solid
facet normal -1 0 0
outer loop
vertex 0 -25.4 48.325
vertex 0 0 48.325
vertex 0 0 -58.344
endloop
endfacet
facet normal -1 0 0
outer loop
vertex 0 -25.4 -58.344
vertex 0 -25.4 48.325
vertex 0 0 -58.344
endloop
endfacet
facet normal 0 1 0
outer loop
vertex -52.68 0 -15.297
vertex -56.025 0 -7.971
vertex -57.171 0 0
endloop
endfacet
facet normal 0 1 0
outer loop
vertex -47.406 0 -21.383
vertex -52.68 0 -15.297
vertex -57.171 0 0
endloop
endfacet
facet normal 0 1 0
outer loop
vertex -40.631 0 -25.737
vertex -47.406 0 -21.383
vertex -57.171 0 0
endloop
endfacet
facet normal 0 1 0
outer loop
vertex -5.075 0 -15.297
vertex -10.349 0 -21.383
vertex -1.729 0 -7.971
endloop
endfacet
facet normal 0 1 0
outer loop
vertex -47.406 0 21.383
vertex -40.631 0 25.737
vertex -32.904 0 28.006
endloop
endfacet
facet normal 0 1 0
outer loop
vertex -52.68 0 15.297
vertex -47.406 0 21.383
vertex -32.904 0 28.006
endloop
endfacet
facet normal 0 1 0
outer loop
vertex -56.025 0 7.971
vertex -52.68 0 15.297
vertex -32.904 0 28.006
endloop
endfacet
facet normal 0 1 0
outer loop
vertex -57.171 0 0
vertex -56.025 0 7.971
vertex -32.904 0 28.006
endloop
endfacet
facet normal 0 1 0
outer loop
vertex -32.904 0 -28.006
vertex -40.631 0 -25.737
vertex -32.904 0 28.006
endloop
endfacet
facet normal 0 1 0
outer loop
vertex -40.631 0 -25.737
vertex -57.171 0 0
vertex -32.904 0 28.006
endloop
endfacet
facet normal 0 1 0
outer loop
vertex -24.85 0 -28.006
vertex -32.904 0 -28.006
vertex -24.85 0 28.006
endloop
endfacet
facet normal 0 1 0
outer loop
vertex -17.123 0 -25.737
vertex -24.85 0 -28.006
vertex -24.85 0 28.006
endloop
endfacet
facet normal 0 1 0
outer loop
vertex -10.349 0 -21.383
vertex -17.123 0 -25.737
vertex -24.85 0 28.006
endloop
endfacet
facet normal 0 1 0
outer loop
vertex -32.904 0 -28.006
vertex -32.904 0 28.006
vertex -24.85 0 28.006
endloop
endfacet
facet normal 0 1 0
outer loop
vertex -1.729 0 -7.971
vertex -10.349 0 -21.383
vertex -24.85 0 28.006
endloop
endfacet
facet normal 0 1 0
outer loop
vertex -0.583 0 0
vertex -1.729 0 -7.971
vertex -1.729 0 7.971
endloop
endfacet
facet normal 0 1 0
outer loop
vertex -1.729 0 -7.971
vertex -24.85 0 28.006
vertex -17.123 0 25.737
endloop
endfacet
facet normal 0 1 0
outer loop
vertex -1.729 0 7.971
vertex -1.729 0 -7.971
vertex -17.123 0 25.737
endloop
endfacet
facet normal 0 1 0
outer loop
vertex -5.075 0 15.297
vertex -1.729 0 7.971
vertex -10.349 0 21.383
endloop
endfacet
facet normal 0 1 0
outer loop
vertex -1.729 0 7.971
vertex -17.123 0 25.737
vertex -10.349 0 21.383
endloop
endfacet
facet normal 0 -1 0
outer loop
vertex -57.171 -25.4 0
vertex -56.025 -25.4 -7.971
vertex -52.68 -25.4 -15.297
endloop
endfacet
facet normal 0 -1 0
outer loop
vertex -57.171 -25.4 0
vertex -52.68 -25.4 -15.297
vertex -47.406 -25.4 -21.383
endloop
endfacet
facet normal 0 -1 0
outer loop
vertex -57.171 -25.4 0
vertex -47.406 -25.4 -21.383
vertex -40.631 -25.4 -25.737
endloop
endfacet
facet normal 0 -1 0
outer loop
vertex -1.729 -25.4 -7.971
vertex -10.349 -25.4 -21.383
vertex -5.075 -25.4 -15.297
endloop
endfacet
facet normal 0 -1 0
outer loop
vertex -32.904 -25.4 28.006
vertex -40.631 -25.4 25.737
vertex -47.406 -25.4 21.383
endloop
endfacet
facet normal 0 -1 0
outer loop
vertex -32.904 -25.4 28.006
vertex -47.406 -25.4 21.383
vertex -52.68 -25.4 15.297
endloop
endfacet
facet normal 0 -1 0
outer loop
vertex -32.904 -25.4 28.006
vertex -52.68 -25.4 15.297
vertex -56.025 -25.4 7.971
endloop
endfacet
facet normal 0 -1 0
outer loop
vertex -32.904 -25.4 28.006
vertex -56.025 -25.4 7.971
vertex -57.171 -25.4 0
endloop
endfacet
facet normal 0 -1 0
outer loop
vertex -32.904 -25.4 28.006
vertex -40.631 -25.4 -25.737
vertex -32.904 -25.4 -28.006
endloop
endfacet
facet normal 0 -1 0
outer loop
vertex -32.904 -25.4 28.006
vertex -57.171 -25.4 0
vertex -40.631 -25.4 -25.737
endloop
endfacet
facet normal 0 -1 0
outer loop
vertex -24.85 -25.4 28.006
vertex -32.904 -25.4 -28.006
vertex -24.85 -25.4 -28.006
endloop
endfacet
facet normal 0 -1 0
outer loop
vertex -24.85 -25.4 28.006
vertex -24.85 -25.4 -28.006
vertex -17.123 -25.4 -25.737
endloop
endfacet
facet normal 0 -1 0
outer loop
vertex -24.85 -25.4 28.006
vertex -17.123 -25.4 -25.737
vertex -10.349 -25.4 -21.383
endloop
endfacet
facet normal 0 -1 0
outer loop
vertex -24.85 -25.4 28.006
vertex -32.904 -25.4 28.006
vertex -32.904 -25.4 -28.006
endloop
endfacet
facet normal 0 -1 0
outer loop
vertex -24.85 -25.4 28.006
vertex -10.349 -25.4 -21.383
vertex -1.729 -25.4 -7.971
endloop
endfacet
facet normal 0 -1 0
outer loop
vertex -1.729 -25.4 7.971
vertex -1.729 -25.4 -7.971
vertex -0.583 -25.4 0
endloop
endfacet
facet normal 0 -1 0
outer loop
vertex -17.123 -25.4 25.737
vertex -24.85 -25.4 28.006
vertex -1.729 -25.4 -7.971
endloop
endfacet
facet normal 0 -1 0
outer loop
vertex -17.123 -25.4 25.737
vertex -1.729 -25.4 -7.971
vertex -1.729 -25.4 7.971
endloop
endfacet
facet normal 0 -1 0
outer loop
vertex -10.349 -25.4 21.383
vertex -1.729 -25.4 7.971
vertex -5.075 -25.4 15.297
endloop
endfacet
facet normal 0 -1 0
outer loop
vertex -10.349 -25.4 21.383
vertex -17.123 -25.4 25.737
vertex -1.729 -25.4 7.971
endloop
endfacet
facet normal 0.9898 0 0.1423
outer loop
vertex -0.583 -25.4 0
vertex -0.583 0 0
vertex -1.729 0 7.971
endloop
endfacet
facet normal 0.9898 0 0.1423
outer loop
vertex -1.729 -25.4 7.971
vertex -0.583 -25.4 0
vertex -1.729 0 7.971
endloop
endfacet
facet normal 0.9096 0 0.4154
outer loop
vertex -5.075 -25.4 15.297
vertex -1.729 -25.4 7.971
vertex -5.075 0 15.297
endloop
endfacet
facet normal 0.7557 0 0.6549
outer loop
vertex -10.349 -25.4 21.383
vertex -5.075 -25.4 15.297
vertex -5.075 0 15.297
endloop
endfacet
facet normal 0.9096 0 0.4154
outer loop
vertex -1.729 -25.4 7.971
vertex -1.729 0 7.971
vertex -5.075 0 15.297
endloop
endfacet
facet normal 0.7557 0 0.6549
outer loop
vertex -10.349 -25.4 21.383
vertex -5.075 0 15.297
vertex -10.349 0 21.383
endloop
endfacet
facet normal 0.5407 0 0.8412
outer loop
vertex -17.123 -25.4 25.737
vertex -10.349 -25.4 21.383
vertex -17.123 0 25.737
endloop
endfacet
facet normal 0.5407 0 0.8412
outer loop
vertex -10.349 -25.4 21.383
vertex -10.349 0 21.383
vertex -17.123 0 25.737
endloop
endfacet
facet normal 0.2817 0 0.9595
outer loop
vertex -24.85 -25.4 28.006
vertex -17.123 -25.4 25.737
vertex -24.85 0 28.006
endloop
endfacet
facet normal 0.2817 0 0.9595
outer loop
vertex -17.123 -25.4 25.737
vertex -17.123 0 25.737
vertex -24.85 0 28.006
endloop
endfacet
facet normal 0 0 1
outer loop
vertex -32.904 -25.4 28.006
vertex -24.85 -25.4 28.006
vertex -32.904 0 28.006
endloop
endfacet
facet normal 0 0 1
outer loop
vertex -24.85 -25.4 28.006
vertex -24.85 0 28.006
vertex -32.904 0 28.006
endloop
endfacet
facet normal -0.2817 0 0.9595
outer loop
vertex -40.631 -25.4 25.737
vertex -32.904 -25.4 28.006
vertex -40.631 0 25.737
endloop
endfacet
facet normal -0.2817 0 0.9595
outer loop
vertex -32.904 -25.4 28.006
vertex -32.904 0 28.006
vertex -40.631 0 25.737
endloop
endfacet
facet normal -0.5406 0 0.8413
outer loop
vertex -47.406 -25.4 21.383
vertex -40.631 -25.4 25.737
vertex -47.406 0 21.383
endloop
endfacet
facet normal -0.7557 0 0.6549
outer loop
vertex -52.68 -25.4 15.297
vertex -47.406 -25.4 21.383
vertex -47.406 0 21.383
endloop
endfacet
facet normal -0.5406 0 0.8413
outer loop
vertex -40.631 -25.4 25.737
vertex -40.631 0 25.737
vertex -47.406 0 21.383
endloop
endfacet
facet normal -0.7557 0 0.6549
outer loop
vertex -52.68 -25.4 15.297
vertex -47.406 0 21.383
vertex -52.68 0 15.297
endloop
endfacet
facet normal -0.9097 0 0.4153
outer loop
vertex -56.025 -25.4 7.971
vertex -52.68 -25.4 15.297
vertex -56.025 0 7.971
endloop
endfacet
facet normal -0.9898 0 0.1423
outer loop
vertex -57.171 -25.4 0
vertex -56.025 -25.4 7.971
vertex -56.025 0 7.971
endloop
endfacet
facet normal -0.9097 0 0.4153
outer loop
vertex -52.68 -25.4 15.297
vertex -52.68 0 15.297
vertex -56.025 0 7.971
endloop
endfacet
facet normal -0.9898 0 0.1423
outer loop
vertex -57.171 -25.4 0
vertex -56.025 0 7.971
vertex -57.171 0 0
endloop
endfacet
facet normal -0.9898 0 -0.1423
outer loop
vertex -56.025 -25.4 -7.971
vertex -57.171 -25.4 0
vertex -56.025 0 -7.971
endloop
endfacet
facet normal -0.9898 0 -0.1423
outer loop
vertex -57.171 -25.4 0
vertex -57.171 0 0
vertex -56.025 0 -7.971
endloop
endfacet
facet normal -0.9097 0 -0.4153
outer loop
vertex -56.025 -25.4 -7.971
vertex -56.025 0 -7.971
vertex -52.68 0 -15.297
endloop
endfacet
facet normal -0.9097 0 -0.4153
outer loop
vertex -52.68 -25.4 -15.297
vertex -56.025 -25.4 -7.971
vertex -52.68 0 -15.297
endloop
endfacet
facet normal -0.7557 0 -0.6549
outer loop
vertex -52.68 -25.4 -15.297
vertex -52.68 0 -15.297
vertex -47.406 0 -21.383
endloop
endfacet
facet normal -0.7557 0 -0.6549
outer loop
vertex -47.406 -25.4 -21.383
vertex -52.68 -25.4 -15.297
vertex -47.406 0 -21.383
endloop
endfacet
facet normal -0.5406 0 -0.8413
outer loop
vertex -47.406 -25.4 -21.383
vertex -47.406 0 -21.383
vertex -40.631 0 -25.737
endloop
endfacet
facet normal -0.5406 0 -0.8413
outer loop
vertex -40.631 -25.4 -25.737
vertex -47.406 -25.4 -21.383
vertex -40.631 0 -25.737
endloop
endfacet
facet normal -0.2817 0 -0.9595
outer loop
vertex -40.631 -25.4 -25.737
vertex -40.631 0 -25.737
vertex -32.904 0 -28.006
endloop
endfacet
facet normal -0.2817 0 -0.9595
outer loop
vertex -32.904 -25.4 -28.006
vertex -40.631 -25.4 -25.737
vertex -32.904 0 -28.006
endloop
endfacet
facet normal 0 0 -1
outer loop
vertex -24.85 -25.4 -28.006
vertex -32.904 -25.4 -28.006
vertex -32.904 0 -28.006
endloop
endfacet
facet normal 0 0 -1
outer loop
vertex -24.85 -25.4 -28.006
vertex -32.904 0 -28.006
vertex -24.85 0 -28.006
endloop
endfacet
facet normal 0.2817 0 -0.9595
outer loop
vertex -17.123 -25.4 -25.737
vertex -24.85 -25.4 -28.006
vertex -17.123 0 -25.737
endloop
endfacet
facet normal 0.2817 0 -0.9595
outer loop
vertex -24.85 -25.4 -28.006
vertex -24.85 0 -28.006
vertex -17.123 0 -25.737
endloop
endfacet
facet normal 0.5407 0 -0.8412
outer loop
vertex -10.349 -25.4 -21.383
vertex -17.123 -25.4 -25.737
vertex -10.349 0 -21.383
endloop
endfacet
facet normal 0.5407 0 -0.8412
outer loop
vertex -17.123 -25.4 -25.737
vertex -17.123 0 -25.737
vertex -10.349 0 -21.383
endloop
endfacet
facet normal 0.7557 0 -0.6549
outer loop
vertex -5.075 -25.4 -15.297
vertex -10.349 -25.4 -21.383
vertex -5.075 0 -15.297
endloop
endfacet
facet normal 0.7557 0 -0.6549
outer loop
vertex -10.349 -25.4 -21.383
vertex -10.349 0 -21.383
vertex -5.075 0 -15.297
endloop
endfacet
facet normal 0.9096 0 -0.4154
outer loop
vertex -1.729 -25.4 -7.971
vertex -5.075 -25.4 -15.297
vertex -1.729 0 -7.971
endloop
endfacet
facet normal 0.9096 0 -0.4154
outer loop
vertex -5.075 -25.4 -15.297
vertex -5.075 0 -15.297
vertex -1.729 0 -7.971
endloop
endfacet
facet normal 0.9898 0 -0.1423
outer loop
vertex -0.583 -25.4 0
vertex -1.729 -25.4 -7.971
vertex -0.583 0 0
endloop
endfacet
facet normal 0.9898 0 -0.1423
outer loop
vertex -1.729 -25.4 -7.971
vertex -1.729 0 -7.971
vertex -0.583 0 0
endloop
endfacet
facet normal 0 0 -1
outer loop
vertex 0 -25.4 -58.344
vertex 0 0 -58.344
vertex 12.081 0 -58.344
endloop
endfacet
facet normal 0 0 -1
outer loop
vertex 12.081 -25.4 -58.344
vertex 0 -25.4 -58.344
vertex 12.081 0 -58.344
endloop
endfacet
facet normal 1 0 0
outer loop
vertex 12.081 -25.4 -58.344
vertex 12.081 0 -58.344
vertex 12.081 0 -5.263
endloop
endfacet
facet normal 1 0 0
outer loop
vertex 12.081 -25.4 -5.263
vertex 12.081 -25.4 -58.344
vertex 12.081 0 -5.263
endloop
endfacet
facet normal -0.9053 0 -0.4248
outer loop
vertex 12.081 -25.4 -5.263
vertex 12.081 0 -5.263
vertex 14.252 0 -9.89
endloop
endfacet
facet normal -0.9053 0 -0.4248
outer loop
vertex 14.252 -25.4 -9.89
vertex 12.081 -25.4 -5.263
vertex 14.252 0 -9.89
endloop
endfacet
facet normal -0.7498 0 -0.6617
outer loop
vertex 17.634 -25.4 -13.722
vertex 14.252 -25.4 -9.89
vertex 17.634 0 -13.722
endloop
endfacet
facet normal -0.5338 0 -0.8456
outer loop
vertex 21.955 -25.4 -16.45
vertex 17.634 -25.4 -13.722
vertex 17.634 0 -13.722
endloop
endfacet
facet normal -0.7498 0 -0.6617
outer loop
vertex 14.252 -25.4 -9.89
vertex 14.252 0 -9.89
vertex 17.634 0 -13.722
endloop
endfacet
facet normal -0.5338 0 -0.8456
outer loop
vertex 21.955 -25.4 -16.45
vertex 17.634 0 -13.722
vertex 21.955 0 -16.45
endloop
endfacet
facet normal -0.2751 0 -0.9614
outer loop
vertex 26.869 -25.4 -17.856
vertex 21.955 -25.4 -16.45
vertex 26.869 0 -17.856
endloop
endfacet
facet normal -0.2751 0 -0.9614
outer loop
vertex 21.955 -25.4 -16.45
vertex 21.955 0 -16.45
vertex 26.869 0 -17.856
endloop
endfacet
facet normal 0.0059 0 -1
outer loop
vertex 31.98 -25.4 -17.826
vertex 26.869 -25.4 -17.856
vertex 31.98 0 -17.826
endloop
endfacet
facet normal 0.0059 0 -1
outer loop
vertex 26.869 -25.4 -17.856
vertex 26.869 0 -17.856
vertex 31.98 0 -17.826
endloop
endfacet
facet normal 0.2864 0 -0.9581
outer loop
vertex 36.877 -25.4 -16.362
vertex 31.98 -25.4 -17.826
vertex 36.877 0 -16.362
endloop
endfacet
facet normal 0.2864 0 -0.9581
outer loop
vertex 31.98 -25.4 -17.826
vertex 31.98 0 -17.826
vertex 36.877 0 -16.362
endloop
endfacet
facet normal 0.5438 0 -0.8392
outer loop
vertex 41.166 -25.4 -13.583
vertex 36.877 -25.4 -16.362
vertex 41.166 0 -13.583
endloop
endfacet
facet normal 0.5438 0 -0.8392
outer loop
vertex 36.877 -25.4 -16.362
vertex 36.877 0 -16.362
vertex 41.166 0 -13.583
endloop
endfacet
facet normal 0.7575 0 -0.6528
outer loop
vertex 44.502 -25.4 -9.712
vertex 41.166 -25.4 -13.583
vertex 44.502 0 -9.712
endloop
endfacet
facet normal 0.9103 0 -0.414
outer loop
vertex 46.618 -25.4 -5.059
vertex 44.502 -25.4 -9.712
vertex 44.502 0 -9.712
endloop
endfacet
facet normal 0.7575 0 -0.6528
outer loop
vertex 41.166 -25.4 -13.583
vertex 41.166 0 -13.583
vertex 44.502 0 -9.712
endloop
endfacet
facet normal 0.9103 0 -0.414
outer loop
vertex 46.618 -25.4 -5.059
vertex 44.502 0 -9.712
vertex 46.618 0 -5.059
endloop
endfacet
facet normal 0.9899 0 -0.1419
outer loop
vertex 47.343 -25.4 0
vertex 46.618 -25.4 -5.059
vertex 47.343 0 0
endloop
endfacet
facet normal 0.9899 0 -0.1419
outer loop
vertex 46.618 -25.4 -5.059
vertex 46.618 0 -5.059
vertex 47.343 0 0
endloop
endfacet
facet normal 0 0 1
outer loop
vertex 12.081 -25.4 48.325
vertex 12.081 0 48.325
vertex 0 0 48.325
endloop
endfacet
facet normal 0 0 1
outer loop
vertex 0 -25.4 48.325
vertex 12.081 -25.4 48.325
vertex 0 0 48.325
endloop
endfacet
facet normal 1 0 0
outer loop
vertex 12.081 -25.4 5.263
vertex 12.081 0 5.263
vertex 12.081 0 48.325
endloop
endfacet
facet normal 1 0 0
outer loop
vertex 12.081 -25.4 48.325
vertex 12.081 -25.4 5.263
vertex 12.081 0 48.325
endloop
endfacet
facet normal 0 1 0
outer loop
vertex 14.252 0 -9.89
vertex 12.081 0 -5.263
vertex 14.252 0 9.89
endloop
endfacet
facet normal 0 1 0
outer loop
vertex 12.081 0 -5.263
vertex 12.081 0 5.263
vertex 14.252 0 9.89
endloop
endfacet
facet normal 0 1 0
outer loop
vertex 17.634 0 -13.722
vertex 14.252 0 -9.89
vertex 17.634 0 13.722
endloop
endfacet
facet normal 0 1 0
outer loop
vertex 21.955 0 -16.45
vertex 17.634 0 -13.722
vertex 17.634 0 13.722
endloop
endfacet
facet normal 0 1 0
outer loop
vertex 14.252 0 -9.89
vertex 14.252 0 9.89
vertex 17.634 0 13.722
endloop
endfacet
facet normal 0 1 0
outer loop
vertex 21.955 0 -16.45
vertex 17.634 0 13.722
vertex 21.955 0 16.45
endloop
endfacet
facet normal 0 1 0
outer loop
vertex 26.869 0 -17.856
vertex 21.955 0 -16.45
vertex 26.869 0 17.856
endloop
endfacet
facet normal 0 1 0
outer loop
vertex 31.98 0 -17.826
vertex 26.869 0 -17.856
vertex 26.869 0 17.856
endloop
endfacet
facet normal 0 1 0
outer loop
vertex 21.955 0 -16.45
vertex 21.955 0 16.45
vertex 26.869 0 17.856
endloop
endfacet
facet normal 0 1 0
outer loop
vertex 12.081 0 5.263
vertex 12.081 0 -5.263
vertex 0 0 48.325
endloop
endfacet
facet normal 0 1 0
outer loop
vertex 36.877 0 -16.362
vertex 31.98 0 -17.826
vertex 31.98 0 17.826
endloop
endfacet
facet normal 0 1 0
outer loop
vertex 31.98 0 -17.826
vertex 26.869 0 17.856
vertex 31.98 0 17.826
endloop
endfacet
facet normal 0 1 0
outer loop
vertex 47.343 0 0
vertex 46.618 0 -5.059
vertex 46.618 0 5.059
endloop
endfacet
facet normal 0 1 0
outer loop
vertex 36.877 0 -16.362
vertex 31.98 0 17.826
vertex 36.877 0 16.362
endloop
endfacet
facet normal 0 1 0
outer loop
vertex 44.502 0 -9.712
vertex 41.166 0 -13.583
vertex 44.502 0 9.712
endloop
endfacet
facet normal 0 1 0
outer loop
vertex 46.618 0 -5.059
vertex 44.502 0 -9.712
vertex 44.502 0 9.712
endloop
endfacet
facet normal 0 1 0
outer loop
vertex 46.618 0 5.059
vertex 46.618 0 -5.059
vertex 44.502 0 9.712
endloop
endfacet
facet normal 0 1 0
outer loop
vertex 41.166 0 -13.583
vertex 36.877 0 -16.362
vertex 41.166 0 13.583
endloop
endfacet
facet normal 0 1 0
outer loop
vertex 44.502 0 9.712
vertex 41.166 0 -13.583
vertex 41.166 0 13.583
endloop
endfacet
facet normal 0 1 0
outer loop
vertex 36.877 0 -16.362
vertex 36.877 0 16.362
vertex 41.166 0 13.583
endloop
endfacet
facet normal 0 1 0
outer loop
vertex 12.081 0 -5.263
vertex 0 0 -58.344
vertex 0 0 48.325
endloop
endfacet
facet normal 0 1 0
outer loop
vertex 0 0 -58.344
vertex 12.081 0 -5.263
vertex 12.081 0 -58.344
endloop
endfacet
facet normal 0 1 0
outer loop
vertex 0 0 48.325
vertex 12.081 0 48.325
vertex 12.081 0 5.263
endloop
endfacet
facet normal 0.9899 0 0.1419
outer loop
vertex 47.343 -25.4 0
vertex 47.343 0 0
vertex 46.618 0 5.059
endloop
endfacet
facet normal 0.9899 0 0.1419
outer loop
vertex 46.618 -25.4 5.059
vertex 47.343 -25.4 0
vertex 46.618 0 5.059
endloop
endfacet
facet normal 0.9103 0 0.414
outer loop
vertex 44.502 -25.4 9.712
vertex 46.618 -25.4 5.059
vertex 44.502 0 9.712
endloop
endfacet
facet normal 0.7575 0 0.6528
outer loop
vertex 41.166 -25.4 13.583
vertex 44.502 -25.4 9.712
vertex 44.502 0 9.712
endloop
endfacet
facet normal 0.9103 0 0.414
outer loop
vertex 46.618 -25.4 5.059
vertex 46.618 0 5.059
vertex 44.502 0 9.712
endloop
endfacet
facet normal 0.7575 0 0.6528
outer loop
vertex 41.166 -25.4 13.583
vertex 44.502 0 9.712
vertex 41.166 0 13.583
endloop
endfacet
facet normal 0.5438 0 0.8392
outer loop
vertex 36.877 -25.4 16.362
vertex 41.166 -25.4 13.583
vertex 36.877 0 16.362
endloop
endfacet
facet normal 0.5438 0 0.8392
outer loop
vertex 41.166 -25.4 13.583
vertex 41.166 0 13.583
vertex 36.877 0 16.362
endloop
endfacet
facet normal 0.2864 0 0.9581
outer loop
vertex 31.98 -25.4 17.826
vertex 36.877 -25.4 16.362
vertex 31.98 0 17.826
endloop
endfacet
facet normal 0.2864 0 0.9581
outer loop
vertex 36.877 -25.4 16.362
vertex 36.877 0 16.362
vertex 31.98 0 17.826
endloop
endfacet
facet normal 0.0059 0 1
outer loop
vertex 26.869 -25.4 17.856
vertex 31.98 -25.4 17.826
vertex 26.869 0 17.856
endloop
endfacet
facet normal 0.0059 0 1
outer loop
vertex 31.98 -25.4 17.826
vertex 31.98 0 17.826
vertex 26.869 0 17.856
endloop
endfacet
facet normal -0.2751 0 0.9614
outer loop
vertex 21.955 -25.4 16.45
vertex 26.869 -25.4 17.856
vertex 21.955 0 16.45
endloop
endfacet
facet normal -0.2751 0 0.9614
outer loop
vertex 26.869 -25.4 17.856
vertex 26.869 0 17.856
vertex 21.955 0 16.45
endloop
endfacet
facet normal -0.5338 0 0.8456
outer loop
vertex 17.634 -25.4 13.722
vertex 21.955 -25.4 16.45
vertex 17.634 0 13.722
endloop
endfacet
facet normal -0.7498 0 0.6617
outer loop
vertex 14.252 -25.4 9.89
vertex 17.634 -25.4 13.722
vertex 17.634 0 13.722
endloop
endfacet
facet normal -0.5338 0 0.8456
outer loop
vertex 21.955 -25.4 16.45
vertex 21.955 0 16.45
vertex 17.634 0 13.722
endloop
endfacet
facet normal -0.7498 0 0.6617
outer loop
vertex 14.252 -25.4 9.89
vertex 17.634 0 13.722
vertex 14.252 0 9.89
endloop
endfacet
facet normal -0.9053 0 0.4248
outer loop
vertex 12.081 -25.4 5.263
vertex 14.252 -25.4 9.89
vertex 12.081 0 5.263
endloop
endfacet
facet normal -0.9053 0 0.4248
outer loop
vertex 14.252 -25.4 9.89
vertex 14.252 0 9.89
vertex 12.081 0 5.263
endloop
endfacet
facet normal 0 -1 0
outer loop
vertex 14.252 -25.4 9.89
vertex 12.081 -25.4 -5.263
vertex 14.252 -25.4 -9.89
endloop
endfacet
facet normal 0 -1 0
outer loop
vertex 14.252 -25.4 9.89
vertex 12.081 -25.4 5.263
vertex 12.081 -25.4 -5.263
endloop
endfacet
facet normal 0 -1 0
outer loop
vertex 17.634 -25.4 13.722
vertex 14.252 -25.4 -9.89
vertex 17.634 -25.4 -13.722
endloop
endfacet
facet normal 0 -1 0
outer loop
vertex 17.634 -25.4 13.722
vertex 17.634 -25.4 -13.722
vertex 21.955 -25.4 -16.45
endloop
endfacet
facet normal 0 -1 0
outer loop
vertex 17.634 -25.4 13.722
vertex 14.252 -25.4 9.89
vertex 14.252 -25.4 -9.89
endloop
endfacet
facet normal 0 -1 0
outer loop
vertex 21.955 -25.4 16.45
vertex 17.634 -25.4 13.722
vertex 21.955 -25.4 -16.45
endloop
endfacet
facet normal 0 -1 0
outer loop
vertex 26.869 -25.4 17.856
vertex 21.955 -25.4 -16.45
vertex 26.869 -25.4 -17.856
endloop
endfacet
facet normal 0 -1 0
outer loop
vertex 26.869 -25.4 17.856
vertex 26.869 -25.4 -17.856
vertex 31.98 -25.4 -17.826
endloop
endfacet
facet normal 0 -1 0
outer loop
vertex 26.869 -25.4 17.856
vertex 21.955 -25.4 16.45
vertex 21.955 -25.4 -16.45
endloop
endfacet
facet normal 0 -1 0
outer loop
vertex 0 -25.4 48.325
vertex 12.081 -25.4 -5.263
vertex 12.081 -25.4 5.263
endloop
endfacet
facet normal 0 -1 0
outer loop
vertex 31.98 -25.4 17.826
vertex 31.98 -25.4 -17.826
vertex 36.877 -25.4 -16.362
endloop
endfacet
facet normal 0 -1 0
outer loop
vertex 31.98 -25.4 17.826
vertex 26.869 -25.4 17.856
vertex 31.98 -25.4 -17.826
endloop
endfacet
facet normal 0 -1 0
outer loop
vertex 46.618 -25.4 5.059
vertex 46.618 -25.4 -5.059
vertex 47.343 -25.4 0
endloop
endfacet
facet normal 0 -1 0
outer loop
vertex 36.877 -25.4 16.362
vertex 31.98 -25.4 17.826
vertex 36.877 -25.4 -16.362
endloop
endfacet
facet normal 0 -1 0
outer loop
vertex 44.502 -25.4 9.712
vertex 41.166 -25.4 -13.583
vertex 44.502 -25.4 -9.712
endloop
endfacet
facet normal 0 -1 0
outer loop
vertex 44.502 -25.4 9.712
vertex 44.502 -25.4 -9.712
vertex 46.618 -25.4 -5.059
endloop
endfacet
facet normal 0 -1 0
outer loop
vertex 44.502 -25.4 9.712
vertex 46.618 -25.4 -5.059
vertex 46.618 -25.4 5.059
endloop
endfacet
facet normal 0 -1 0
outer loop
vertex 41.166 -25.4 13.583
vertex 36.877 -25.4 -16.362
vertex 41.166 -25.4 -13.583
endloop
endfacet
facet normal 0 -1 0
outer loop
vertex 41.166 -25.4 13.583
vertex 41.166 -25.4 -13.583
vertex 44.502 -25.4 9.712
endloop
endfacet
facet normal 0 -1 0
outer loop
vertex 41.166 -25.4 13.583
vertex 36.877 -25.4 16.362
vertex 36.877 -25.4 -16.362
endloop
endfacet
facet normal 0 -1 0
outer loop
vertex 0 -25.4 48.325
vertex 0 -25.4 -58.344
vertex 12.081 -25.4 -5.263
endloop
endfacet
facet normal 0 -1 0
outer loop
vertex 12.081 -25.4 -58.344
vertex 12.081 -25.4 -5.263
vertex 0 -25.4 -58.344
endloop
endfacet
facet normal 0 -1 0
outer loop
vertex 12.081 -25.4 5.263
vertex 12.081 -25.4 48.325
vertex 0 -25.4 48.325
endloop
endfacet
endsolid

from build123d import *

# Parameters (mm, degrees)
F1_DEPTH = 25.4
F0_R     = 28.2939583949


with BuildPart() as f1:
    # F0 (on Front) → F1 (new body)
    with BuildSketch(Plane.XZ):
        with BuildLine():
            Line((12.0812505484, 48.3250170946), (0, 48.3250170946))
            Line((0, 48.3250170946), (0, -58.3435744047))
            Line((0, -58.3435744047), (12.0812505484, -58.3435744047))
            Line((12.0812505484, -58.3435744047), (12.0812505484, -5.262906618))
            ThreePointArc((12.0812505484, -5.262906618), (11.2957379071, 0), (12.0812505484, 5.262906618))
            Line((12.0812505484, 5.262906618), (12.0812505484, 48.3250170946))
        make_face()
        with BuildLine():
            ThreePointArc((47.3425367626, 0), (31.9797395307, 17.8259396074), (12.0812505484, 5.262906618))
            Line((12.0812505484, 5.262906618), (12.0812505484, -5.262906618))
            ThreePointArc((12.0812505484, -5.262906618), (31.9797395307, -17.8259396074), (47.3425367626, 0))
        make_face()
        with BuildLine():
            Line((12.0812505484, -5.262906618), (12.0812505484, 5.262906618))
            ThreePointArc((12.0812505484, 5.262906618), (11.2957379071, 0), (12.0812505484, -5.262906618))
        make_face()
    extrude(amount=F1_DEPTH)


with BuildPart() as f1b:
    # F0 (on Front) → F1, piece 2 (new body)
    with BuildSketch(Plane.XZ):
        with Locations((-28.8771316409, 0)):
            Circle(F0_R)
    extrude(amount=F1_DEPTH)


solid = Compound([f1.part, f1b.part])
